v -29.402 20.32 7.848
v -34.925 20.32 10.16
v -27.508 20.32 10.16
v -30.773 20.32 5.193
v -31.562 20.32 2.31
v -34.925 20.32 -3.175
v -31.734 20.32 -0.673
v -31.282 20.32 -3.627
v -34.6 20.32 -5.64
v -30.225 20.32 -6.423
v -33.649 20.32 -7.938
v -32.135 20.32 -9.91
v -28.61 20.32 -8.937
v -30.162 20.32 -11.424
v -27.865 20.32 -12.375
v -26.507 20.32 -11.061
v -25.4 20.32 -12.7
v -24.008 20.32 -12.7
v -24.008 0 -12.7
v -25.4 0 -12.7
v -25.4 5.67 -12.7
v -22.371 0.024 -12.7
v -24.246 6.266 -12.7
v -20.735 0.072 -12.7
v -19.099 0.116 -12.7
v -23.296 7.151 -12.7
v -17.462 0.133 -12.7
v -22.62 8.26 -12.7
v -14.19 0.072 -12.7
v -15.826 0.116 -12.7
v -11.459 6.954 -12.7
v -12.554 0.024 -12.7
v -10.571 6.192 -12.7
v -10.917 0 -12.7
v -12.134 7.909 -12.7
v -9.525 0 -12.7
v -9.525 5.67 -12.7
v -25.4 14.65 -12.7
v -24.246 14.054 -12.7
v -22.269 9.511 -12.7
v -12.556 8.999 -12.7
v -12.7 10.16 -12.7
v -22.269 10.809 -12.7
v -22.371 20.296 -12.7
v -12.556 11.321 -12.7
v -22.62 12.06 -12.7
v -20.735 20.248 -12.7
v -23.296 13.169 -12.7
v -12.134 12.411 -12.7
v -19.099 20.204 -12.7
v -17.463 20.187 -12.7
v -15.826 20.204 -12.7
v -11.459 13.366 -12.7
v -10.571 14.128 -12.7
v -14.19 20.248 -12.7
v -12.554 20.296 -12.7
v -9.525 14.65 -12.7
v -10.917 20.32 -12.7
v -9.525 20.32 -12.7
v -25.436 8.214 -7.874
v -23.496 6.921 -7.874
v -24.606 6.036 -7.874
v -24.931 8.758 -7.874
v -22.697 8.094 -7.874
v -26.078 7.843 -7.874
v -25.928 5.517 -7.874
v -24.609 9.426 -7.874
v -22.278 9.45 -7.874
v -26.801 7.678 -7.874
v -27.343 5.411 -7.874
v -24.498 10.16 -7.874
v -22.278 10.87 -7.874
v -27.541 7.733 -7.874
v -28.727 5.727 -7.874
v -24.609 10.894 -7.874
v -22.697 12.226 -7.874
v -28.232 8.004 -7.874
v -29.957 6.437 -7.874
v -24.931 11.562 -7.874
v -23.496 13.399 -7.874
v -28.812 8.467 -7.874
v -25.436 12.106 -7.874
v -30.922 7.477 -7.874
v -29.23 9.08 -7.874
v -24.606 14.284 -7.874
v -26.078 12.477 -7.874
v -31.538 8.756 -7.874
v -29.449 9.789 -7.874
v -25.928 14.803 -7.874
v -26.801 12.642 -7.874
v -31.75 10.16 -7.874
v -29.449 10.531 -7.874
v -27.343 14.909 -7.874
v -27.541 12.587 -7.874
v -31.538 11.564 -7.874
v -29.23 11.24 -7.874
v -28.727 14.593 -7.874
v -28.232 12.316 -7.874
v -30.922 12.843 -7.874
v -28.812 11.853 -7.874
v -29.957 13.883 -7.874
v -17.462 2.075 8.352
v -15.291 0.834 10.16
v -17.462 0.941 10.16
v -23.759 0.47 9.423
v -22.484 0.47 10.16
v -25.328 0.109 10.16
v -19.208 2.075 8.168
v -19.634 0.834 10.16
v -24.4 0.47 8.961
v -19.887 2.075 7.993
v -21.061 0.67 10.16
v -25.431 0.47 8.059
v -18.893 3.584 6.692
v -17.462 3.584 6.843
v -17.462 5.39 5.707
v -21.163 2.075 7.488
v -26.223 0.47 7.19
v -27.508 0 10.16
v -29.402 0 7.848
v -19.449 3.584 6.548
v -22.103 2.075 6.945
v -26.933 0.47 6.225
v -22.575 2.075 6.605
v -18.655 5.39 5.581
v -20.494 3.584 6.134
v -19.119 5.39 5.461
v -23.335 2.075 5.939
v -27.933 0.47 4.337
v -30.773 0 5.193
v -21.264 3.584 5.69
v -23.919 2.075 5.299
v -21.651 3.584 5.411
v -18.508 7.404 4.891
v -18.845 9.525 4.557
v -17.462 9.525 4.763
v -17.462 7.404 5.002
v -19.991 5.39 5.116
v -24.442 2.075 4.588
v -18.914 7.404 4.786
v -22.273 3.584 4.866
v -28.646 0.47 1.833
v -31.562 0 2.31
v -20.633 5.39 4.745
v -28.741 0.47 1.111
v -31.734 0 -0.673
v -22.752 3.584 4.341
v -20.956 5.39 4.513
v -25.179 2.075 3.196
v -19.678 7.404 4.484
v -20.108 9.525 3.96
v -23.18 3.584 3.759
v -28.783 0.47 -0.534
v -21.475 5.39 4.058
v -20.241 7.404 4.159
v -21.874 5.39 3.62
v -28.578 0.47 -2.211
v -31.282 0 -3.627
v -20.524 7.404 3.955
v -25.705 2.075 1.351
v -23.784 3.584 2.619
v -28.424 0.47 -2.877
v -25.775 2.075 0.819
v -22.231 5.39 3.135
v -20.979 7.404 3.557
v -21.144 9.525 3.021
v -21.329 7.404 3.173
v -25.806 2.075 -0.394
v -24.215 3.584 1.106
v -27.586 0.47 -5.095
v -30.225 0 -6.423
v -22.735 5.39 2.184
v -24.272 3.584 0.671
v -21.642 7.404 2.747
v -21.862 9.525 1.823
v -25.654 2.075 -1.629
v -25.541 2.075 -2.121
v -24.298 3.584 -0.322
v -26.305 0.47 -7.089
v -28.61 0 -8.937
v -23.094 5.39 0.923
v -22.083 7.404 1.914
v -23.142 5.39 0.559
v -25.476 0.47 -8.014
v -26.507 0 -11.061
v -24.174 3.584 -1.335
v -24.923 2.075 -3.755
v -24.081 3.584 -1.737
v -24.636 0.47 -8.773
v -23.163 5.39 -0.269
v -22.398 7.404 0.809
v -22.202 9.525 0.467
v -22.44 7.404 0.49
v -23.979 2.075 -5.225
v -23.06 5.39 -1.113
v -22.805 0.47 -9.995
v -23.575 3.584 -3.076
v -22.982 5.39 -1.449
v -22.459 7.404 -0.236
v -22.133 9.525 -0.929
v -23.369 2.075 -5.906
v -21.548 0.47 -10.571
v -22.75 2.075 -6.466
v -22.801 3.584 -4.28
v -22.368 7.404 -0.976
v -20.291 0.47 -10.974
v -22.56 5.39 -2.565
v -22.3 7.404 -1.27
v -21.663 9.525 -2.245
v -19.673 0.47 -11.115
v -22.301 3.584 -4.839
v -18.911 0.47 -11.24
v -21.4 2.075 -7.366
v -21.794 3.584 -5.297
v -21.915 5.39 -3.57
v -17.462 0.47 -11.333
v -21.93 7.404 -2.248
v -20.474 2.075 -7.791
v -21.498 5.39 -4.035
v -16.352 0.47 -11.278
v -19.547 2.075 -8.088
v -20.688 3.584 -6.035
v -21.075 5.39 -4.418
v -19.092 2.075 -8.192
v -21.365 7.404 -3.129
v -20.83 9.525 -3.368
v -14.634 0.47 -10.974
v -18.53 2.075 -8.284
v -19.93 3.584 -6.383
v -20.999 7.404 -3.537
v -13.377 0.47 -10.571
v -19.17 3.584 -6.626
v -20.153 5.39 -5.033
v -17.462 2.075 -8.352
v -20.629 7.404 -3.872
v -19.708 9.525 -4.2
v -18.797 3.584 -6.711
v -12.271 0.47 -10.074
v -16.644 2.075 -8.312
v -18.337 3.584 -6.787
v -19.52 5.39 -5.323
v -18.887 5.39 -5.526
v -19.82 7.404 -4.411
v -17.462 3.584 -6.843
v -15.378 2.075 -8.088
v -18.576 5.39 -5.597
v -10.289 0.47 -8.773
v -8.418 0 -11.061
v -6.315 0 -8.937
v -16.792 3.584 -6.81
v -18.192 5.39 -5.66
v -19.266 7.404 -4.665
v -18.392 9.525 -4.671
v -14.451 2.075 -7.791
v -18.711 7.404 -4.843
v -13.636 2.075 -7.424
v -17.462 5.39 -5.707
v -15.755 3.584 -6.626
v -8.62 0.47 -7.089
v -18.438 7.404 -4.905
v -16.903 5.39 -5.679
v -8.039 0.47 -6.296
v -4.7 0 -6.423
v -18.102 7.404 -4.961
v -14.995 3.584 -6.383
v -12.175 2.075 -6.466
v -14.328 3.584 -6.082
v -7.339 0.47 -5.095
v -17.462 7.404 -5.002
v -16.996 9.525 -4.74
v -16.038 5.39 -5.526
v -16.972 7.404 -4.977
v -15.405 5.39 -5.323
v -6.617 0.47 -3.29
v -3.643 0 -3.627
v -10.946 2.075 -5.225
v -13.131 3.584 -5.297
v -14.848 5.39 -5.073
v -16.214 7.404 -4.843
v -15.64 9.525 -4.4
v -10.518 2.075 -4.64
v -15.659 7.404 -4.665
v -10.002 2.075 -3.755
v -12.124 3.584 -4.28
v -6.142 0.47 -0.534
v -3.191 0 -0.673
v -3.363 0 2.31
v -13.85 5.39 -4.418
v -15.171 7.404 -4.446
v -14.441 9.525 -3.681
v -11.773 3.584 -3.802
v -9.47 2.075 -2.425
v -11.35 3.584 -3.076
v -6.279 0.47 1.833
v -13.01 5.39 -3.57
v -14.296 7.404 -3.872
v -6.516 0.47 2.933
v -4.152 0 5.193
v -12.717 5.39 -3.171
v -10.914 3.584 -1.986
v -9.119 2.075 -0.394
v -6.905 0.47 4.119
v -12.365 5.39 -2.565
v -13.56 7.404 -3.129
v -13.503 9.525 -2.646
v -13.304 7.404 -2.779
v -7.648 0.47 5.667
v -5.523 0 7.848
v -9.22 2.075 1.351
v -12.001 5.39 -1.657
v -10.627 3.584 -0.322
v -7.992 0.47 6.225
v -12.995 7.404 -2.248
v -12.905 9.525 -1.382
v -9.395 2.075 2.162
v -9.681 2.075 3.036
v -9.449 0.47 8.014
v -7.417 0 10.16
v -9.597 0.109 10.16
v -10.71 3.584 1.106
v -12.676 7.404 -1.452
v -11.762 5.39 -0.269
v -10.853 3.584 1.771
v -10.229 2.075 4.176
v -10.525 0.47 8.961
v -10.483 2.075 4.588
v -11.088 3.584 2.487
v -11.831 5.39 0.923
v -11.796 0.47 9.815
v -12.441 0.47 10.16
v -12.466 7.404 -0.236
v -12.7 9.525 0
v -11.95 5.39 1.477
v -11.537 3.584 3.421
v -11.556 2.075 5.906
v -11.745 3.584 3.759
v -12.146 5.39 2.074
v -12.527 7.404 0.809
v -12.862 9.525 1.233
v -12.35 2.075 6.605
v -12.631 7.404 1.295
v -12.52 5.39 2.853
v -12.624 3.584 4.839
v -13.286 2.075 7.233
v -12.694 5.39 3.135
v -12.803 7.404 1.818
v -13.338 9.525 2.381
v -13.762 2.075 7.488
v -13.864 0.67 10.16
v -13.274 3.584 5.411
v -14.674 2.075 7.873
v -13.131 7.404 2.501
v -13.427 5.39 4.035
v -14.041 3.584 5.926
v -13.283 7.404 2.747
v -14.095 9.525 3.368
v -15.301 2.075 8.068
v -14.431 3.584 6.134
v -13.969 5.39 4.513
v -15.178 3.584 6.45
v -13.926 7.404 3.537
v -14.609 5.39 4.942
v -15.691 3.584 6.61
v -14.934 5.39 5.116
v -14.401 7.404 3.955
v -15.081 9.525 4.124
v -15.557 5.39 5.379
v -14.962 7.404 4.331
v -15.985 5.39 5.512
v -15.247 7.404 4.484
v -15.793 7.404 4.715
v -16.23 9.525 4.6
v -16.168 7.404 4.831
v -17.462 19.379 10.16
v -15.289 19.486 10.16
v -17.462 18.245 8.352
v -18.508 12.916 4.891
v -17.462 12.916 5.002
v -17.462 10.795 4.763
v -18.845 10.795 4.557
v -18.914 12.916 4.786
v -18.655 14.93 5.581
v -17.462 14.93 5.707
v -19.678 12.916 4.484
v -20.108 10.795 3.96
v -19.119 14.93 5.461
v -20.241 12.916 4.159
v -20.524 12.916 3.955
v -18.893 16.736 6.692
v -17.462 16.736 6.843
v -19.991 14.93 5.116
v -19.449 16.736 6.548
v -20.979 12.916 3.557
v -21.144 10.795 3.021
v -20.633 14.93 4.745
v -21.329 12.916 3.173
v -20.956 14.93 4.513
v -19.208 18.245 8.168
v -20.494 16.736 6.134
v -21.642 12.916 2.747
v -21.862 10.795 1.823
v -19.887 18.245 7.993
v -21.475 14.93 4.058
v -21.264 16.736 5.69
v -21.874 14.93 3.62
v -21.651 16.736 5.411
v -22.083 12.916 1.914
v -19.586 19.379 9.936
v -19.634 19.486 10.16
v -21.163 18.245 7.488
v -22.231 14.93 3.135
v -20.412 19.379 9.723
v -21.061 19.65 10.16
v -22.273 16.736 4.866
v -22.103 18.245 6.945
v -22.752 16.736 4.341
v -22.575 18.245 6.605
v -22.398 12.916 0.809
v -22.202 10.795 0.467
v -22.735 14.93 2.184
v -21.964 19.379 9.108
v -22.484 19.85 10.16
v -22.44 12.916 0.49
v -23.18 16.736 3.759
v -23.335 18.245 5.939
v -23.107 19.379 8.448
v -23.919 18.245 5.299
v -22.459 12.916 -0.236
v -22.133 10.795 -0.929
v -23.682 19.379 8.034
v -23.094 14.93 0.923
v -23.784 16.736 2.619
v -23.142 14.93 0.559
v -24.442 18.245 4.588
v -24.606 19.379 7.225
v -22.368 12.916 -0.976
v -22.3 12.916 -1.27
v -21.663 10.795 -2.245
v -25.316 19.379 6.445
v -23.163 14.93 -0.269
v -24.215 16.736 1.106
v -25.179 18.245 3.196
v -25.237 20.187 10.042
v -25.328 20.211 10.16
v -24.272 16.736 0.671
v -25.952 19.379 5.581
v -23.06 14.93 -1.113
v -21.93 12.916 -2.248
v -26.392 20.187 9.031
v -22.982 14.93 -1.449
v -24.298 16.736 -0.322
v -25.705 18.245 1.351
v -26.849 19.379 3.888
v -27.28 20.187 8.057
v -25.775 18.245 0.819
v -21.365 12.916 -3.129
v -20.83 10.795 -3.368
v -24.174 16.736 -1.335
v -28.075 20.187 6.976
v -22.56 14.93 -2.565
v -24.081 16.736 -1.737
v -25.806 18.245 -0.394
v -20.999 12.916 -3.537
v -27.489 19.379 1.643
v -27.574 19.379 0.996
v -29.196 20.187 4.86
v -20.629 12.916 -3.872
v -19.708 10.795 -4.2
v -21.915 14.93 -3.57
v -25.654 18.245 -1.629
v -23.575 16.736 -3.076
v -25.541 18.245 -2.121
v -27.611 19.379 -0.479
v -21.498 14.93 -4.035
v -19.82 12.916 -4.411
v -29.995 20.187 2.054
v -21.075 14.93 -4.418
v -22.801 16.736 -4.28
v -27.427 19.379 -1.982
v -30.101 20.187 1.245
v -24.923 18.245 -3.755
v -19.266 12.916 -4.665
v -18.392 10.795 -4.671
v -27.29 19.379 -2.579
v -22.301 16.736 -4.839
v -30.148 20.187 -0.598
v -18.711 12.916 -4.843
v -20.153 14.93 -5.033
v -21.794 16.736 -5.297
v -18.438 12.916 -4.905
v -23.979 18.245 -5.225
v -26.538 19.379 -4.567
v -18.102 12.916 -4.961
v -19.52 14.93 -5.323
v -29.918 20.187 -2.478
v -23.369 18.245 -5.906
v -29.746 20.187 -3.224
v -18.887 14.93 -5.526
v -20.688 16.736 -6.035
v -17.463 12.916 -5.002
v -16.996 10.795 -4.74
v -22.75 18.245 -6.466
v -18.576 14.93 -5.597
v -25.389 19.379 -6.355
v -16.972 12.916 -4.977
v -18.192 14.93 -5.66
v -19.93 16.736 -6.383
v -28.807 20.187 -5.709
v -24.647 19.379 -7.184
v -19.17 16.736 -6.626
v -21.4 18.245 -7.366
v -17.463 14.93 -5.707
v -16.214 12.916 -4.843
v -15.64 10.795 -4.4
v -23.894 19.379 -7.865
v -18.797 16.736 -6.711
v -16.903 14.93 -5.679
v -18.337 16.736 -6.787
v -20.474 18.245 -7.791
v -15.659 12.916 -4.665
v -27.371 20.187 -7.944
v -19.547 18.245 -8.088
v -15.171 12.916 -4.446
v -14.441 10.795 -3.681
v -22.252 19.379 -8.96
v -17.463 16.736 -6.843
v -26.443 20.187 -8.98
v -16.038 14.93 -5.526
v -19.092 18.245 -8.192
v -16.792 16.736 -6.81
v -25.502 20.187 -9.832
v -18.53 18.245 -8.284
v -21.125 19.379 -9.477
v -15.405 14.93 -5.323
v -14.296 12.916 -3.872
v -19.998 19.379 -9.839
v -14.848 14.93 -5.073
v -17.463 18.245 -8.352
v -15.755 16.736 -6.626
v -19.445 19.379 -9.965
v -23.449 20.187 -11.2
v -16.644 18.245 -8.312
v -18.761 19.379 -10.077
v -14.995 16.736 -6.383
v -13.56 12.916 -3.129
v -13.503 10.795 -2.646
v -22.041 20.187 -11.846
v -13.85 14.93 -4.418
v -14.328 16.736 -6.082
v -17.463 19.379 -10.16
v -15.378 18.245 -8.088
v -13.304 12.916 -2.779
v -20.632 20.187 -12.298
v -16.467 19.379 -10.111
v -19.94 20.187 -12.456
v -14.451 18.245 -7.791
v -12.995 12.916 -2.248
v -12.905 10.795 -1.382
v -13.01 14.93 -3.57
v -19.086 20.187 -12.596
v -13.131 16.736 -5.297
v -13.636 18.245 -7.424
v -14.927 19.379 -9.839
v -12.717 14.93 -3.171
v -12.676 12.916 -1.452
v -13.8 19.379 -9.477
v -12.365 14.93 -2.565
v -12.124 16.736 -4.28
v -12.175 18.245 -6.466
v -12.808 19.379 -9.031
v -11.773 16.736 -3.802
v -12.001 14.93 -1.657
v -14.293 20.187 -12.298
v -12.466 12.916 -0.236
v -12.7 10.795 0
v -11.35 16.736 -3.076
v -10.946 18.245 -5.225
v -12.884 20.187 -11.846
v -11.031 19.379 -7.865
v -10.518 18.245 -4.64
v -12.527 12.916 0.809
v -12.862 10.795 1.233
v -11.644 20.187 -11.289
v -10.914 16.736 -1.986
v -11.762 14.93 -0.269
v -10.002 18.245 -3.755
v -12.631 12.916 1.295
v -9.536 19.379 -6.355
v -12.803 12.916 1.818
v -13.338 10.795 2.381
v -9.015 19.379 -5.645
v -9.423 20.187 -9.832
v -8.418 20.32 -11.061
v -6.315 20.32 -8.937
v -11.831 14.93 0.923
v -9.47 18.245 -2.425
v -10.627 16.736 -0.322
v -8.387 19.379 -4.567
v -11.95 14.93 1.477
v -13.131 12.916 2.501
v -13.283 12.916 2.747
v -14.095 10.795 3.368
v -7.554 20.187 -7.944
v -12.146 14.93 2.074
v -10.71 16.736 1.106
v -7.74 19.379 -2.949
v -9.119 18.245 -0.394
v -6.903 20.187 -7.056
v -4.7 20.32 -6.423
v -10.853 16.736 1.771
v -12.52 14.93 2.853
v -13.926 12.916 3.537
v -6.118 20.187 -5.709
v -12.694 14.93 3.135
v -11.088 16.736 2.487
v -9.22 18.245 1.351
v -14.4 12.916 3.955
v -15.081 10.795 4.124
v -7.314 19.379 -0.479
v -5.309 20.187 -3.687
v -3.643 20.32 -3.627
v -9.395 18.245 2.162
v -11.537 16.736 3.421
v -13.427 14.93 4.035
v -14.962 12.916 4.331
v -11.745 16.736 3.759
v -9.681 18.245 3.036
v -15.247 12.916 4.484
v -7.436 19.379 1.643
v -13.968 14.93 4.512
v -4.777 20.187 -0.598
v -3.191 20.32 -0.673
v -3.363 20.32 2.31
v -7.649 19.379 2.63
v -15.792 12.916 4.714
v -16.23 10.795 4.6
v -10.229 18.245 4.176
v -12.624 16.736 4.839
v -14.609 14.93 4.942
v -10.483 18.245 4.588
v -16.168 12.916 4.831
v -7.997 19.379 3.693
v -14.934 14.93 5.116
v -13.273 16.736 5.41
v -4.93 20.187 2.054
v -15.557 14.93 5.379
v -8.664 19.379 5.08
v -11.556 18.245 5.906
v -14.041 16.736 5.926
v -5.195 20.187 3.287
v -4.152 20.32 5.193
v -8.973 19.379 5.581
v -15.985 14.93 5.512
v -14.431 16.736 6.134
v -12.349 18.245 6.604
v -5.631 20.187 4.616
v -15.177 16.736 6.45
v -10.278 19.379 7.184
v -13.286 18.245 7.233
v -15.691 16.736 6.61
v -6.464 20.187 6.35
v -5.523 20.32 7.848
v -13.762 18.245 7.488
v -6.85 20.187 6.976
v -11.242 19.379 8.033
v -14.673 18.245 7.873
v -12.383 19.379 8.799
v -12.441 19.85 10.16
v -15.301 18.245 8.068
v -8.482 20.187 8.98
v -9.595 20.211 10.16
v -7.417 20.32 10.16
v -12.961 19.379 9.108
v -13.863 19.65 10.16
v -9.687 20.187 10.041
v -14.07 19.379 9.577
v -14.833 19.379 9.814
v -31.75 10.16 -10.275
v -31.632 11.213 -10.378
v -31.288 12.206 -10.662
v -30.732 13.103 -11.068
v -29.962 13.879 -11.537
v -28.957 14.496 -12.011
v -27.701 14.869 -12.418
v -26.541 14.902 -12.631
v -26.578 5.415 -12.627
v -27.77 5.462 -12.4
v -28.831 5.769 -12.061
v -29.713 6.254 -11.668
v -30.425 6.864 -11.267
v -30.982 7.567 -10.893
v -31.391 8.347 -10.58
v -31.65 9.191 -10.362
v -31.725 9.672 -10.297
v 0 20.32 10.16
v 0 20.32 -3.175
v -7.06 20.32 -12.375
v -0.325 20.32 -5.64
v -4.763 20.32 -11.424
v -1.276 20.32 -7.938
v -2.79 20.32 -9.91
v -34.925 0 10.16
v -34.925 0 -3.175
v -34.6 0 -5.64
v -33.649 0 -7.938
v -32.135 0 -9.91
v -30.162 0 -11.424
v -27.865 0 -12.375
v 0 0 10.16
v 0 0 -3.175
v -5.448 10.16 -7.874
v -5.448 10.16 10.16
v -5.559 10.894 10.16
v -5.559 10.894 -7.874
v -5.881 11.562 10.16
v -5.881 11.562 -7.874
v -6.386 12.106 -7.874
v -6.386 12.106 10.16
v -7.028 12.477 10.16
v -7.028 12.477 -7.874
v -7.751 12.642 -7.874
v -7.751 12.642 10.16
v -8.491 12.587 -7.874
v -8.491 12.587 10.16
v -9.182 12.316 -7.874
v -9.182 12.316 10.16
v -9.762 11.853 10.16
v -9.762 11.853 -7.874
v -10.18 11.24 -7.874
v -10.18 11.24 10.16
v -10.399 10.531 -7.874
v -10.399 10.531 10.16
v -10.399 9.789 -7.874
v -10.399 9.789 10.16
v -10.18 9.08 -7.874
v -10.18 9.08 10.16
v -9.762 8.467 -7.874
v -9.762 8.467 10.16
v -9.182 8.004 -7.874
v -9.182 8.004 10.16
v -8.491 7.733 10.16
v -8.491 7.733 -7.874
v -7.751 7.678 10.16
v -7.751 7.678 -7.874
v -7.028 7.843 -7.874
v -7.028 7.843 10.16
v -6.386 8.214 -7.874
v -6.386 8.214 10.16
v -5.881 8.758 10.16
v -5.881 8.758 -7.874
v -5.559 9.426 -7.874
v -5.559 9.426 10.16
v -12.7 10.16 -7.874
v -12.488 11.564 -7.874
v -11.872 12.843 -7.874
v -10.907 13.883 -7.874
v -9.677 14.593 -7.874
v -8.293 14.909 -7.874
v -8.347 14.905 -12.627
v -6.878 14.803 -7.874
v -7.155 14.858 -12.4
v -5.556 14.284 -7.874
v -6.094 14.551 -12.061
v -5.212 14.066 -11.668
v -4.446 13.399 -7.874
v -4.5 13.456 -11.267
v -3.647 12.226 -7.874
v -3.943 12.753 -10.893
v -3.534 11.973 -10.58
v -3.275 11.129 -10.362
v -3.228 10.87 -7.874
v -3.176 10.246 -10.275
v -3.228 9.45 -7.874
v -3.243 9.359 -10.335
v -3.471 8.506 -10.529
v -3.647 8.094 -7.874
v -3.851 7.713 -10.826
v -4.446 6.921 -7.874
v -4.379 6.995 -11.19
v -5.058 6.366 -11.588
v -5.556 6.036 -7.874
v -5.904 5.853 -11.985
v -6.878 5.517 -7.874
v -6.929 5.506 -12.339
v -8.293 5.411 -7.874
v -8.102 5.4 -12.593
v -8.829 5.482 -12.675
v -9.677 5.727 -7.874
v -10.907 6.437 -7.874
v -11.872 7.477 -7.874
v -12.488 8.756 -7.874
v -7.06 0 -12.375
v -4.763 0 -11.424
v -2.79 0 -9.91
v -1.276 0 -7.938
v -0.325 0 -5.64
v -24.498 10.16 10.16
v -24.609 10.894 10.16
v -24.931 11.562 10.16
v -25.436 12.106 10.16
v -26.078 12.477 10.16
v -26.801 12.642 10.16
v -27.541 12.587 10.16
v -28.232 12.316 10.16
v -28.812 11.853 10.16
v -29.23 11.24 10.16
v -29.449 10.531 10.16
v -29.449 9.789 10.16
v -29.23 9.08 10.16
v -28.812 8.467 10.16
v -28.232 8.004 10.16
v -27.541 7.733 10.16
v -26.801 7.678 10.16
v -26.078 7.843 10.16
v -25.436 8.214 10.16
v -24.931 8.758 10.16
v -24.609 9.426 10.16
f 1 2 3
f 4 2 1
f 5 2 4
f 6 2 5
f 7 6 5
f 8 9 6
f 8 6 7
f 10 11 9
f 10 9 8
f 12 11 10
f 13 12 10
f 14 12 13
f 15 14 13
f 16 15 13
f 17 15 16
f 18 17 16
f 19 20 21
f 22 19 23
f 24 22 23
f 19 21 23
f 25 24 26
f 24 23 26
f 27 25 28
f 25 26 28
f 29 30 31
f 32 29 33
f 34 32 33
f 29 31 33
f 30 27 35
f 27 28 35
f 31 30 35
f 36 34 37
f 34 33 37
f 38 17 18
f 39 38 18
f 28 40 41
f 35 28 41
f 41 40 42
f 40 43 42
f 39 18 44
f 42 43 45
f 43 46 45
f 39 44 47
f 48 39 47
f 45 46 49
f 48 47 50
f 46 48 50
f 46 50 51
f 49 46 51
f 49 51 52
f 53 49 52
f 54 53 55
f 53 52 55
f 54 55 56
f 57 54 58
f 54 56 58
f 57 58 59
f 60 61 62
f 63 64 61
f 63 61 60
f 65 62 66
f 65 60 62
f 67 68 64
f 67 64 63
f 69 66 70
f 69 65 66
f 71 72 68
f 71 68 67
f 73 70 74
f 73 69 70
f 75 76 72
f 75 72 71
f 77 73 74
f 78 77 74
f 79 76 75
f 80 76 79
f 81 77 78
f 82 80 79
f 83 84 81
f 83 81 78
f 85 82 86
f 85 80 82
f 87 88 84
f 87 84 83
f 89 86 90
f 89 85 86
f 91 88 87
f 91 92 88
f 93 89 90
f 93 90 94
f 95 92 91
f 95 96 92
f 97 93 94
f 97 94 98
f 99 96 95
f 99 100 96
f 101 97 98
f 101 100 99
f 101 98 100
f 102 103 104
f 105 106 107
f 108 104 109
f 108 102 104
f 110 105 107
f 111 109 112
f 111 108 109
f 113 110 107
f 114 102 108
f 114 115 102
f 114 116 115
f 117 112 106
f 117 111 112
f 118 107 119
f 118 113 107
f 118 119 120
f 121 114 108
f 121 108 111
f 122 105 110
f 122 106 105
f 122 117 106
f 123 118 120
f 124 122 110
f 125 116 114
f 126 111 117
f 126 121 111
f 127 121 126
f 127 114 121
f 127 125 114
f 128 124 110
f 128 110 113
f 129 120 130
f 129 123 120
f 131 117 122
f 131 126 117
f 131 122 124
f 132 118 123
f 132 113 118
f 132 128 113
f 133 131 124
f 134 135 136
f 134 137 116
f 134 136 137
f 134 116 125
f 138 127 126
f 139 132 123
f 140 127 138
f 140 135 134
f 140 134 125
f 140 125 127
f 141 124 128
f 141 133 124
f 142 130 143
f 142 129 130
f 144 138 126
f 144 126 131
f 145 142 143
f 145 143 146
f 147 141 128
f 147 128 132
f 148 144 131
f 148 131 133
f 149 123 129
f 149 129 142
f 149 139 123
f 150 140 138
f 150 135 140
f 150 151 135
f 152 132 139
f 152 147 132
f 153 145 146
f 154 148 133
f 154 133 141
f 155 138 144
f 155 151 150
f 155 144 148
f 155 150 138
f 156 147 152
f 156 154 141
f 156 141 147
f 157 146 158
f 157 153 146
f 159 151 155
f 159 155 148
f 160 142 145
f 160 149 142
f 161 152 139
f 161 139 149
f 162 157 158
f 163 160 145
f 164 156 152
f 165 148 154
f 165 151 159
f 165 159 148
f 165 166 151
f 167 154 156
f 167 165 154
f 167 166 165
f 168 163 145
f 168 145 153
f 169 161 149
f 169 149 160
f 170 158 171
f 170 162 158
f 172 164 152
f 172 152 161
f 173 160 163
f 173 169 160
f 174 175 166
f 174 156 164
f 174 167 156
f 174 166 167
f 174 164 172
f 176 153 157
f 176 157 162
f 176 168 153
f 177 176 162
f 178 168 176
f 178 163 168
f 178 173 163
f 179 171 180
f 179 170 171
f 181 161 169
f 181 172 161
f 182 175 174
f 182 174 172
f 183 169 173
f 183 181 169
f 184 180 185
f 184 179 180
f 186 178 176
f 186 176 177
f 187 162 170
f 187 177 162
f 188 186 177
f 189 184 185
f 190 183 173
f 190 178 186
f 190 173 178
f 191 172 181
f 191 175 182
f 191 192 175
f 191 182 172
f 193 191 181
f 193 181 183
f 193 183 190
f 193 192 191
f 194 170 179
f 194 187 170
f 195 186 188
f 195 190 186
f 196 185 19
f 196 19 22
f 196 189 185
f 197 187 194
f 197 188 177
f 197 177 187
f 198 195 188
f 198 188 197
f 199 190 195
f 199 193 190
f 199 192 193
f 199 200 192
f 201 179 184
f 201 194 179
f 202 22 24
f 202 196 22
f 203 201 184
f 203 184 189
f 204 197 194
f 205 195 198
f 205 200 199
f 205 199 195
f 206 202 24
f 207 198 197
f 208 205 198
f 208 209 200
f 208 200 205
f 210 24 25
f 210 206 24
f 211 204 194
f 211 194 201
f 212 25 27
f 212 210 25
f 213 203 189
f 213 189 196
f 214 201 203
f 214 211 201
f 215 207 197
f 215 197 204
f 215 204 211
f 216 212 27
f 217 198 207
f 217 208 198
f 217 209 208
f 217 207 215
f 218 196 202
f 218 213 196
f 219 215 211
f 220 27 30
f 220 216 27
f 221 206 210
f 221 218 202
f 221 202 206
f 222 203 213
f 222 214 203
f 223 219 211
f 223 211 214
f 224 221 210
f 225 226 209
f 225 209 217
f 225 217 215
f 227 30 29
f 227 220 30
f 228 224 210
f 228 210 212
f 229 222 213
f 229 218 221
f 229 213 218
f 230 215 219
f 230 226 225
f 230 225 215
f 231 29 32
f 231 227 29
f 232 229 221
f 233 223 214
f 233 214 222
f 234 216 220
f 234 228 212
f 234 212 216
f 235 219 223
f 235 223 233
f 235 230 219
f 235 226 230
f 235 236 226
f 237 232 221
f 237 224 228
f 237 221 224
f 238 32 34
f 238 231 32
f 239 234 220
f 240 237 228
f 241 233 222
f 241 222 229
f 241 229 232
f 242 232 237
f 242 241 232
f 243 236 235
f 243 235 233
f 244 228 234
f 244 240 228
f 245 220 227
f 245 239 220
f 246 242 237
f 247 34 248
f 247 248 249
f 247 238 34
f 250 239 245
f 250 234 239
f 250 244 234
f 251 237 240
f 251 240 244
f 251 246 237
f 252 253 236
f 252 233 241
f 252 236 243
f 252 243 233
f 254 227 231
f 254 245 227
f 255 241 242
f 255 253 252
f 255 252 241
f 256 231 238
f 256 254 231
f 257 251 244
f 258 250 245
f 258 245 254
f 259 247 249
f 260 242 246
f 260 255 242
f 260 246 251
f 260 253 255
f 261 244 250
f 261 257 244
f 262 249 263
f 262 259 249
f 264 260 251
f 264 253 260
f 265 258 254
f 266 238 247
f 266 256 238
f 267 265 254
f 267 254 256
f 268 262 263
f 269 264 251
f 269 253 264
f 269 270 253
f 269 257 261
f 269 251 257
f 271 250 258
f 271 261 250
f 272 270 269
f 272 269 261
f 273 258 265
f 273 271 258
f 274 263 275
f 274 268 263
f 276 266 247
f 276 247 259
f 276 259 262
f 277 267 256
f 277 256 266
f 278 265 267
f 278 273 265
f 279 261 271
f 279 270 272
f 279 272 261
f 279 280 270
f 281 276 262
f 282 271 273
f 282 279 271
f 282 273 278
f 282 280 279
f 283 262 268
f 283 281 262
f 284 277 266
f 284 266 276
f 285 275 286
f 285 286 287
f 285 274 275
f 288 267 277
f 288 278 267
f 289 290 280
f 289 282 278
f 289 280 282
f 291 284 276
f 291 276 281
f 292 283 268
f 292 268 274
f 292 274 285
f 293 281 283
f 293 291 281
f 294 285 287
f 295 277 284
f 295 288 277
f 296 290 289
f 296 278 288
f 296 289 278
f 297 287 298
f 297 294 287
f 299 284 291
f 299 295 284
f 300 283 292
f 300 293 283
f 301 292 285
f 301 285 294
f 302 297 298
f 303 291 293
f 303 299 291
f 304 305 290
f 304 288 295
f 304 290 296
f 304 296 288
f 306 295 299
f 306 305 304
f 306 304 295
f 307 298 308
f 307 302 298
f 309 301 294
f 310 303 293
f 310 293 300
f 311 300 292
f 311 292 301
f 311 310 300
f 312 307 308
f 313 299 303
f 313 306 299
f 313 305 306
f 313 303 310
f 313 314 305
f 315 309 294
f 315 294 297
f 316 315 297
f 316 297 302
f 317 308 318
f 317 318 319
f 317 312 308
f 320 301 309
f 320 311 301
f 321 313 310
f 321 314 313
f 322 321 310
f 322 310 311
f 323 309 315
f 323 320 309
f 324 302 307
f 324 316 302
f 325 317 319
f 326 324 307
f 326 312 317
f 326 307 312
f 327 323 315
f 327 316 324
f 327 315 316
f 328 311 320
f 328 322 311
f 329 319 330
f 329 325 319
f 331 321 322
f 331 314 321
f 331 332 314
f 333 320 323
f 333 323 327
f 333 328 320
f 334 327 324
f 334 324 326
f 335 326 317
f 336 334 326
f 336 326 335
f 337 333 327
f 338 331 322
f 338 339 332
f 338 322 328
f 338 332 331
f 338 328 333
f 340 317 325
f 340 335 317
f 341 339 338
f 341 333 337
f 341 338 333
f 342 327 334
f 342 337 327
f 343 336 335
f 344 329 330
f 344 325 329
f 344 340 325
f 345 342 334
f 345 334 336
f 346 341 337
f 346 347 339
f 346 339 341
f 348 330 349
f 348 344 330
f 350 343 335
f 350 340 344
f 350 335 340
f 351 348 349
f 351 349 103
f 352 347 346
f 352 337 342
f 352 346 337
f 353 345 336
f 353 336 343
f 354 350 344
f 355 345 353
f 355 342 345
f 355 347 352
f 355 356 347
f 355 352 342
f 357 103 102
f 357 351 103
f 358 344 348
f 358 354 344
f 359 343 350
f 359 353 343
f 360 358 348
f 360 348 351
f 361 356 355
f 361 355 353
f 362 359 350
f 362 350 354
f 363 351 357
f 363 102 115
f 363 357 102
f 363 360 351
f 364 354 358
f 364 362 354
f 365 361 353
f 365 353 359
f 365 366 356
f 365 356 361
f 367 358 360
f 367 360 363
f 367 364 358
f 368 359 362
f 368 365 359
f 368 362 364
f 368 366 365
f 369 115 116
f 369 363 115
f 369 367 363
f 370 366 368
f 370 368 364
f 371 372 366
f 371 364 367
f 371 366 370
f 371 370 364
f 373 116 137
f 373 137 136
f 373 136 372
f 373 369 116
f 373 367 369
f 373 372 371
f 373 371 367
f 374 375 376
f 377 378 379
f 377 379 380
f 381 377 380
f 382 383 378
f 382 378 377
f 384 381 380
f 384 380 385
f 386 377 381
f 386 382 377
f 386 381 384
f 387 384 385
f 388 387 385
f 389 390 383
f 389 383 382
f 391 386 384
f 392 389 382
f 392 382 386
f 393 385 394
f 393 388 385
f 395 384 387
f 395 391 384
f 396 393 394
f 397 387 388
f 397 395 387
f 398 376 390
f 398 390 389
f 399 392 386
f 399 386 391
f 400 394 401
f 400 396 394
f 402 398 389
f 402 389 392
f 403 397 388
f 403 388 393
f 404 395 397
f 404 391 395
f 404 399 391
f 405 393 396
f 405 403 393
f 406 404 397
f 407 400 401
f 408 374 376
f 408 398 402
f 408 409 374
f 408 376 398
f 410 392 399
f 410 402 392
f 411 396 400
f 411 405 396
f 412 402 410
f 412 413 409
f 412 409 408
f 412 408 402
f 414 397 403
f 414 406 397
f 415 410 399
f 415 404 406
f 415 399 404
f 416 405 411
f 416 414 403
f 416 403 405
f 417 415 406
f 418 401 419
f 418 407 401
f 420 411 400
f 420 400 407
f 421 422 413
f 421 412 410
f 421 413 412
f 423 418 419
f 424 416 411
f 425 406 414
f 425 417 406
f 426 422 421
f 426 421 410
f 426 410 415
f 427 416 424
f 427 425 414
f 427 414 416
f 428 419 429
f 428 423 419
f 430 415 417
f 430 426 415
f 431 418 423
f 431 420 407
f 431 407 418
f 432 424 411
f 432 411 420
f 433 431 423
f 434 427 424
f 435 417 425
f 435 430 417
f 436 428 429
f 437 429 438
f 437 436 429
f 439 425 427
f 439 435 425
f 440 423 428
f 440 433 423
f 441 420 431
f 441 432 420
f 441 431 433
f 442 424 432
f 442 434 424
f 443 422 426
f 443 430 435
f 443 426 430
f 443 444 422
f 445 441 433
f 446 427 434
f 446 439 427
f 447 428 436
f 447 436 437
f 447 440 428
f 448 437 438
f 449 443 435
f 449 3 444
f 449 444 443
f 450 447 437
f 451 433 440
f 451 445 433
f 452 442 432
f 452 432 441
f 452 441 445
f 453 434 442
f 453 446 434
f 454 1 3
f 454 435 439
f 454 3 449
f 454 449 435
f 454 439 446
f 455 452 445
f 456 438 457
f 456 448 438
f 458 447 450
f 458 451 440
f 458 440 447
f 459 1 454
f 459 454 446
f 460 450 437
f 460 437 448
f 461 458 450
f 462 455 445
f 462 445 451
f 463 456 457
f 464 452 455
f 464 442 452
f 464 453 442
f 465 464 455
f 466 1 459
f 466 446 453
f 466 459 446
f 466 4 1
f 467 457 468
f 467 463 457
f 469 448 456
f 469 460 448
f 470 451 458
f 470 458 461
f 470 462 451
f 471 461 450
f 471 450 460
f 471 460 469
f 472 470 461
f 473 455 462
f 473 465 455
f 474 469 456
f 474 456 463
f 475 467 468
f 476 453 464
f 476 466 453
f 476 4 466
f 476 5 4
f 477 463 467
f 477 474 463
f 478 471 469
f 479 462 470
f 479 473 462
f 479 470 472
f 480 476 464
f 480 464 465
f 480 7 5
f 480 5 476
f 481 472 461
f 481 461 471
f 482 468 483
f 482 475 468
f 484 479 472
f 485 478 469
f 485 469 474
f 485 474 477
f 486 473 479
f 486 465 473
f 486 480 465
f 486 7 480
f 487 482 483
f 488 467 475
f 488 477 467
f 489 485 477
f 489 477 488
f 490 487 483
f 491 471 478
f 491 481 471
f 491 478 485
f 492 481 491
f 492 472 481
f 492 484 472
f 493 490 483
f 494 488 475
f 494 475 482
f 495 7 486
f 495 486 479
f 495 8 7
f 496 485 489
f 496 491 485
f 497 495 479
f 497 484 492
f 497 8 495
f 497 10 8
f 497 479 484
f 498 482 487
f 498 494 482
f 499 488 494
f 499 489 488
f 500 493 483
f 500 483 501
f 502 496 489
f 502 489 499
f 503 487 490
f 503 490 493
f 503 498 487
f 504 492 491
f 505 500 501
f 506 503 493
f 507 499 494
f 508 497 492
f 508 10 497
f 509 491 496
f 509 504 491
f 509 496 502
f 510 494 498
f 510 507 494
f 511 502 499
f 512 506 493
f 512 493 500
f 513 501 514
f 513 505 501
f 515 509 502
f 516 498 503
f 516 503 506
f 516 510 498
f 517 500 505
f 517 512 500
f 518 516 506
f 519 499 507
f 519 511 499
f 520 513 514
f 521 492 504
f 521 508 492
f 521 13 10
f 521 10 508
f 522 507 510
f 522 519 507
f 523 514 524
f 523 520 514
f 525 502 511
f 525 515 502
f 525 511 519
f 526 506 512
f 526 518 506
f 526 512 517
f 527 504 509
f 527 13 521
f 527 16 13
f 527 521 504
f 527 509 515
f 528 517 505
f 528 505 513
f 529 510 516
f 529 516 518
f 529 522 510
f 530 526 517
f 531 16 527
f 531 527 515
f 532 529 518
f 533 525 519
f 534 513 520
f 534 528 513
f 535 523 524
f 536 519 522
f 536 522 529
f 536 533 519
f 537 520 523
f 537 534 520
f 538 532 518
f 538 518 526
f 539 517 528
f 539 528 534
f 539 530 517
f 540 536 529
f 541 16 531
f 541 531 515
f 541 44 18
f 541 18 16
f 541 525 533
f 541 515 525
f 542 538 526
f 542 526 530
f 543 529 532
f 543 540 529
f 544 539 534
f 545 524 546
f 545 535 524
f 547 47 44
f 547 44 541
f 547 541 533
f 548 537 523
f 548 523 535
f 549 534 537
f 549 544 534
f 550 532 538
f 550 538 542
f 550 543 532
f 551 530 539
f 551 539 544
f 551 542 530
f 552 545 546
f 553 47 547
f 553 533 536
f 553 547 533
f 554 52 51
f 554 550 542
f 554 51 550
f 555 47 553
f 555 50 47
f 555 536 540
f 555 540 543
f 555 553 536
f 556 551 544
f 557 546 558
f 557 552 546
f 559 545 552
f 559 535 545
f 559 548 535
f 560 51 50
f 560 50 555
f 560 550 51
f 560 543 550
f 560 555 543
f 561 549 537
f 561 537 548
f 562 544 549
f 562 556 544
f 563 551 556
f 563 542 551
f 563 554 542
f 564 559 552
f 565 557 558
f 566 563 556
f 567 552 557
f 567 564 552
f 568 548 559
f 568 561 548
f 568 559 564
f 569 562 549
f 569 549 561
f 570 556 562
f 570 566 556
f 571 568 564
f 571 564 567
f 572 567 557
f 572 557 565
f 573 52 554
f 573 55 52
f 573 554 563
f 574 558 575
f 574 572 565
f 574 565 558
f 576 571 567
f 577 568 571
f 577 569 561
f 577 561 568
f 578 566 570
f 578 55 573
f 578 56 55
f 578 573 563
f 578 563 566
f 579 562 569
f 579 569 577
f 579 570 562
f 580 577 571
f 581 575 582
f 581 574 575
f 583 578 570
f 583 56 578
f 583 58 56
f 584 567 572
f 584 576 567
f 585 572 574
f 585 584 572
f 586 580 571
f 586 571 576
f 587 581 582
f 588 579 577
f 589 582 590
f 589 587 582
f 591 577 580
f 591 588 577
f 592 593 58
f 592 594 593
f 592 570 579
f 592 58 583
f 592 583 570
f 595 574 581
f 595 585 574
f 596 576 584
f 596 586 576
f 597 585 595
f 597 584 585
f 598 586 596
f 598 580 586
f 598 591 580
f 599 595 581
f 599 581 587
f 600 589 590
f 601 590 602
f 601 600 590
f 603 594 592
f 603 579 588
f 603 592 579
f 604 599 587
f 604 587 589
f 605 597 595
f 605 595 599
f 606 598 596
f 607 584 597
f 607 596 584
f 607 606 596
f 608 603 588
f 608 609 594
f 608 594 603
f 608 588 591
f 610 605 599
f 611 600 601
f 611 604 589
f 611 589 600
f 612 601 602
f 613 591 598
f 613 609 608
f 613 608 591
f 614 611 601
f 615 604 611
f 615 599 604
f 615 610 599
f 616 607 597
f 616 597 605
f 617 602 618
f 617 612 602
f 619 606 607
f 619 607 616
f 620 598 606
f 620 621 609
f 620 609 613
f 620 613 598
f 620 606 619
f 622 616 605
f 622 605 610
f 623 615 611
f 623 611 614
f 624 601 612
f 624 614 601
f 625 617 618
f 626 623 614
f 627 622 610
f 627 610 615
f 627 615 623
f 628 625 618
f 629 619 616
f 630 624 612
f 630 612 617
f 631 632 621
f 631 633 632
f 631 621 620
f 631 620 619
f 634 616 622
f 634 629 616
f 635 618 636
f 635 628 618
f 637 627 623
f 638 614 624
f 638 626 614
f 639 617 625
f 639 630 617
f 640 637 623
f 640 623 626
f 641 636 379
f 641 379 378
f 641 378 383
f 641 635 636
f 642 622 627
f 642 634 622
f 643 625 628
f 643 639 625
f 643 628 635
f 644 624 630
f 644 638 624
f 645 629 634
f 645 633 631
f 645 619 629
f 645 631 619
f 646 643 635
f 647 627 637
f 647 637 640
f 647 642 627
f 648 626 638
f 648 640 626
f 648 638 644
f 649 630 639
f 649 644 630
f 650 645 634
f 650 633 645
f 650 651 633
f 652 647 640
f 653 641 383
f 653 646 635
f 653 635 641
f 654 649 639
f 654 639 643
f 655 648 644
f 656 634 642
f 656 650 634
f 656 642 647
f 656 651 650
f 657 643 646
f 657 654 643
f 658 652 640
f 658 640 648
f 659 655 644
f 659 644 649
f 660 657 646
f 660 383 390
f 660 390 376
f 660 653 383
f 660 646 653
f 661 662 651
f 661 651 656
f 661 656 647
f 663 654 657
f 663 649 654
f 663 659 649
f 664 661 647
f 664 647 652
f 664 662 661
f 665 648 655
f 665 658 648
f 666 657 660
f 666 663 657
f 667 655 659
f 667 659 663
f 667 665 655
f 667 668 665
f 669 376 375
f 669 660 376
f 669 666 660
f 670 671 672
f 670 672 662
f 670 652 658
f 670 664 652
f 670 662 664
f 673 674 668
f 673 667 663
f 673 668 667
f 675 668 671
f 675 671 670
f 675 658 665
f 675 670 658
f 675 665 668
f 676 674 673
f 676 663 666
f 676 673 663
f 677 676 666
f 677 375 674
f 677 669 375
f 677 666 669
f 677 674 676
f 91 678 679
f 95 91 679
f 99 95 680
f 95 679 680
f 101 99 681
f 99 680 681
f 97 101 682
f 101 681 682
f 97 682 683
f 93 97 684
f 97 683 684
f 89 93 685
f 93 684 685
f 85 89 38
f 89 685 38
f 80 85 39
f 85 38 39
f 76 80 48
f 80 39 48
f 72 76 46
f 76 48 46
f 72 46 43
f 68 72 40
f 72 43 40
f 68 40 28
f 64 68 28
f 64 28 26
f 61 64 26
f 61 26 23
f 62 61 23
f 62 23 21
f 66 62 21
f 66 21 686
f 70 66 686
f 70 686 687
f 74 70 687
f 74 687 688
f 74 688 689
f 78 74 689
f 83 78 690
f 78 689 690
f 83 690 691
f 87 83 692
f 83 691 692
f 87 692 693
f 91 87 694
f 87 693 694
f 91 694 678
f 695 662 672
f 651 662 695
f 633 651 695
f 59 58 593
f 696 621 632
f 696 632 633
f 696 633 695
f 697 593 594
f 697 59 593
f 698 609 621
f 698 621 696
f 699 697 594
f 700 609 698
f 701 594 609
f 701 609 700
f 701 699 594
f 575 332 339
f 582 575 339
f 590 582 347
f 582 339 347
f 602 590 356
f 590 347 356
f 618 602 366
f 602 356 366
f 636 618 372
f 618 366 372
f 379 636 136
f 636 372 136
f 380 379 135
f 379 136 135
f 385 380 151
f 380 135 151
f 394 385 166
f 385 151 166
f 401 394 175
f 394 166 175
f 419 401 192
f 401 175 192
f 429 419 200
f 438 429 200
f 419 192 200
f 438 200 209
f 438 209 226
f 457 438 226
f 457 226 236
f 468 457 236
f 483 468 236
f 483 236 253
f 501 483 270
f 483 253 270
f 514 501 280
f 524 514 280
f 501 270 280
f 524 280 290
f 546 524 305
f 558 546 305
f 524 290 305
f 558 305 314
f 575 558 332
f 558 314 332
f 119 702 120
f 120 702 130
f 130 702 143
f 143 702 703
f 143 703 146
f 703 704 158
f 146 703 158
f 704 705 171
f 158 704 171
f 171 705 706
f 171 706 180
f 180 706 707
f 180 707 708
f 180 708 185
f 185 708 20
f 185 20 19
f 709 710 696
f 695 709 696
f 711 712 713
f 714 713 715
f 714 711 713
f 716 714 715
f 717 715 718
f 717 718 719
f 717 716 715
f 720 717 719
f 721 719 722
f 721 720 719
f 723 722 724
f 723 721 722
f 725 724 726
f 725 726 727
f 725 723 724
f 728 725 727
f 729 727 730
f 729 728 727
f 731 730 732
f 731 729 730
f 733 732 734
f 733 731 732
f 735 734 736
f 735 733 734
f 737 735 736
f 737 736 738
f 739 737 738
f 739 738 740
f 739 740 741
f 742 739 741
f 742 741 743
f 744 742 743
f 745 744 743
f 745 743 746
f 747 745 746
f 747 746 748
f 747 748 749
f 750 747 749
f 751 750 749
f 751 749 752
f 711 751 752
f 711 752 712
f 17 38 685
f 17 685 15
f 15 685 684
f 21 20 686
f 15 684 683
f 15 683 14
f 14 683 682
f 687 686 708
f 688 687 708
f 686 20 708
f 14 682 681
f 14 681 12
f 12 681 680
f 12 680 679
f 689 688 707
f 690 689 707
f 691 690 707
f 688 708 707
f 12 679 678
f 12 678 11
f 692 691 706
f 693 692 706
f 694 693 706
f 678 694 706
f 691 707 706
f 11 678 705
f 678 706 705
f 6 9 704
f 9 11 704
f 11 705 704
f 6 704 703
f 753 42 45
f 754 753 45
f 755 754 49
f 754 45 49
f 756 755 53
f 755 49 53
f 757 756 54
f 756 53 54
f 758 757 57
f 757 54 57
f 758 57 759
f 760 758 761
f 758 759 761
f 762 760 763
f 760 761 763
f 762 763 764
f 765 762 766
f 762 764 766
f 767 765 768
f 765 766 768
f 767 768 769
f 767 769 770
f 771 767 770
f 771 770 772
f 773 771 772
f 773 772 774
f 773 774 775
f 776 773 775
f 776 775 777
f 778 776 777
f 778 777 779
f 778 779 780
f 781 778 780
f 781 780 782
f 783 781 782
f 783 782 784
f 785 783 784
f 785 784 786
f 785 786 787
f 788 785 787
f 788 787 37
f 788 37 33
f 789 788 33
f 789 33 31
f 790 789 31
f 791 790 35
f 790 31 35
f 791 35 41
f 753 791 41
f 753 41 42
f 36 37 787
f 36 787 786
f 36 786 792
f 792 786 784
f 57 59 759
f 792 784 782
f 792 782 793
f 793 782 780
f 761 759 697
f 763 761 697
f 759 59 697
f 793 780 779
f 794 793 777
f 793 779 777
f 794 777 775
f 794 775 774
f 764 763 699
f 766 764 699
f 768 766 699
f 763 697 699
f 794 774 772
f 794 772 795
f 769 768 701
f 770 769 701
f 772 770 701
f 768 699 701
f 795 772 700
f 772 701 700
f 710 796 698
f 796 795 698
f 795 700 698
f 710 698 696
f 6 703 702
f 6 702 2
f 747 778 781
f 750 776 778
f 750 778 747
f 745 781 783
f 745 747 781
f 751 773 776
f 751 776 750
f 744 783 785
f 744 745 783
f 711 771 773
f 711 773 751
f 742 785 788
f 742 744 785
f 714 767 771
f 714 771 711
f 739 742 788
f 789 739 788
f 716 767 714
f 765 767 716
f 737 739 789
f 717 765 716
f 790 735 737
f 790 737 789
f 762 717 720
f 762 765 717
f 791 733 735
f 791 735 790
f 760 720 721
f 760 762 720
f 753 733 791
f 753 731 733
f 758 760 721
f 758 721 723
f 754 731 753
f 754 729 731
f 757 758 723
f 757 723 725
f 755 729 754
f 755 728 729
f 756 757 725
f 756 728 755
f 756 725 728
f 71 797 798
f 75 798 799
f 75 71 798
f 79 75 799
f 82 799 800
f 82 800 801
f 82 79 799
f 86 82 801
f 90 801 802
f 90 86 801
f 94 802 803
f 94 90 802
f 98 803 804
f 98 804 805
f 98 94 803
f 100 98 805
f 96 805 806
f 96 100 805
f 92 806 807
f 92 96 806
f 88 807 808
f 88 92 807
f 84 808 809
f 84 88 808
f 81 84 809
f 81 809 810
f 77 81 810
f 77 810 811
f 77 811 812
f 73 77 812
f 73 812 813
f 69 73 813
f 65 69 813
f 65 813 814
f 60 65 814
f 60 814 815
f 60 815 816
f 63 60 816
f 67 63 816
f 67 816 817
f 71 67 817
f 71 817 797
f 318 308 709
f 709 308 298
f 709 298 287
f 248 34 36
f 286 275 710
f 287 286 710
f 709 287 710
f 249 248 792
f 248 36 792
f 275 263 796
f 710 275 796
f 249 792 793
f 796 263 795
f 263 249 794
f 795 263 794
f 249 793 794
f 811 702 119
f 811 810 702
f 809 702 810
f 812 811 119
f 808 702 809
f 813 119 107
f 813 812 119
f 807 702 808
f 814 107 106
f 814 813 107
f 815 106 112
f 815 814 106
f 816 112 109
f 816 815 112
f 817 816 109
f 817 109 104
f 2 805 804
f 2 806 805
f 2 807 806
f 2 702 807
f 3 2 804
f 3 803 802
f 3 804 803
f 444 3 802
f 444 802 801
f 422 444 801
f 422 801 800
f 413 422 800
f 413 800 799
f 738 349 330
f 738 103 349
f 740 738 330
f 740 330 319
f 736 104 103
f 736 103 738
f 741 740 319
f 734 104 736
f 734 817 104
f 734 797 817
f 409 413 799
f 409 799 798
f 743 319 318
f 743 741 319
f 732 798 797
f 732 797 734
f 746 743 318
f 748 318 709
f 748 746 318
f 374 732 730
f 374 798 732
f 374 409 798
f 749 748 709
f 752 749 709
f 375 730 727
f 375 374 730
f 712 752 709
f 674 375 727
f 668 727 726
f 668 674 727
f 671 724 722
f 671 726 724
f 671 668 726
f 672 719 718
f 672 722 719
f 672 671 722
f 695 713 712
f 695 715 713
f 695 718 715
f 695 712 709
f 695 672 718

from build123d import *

# Parameters (mm, degrees)
BOSS_EXTRUDE1_DEPTH                             = 10.16
BOSS_EXTRUDE1_DEPTH_BACK                        = 12.7
SKETCH2_W                                       = 34.925
SKETCH2_H                                       = 20.32
SKETCH2_R                                       = 2.4892
SKETCH3_R                                       = 4.7625
CUT_EXTRUDE1_DEPTH                              = 43.35502361
CBORE_FOR_10_SOCKET_HEAD_CAP_SCREW1_D           = 4.9784
CBORE_FOR_10_SOCKET_HEAD_CAP_SCREW1_CBORE_D     = 9.525
CBORE_FOR_10_SOCKET_HEAD_CAP_SCREW1_CBORE_DEPTH = 4.826
FILLET1_R                                       = 9.525


with BuildPart() as part:
    # Sketch2 → Boss-Extrude1 (new, two sides: drawn at the far end of the back side and taken through both)
    with BuildSketch(Plane.XY.offset(-BOSS_EXTRUDE1_DEPTH_BACK)):
        with Locations((-17.4625, 10.16)):
            Rectangle(SKETCH2_W, SKETCH2_H)
        with Locations((-7.9375, 10.16)):
            Circle(SKETCH2_R, mode=Mode.SUBTRACT)
        with Locations((-26.9875, 10.16)):
            Circle(SKETCH2_R, mode=Mode.SUBTRACT)
    extrude(amount=BOSS_EXTRUDE1_DEPTH + BOSS_EXTRUDE1_DEPTH_BACK)

    # Sketch3 → Cut-Extrude1 (cut, through all)
    with BuildSketch(Plane.XZ):
        with Locations((-17.4625, 0)):
            Circle(SKETCH3_R)
    extrude(amount=-CUT_EXTRUDE1_DEPTH, mode=Mode.SUBTRACT)

    # Sketch4 → Cut-Revolve1 (revolve, cut)
    with BuildSketch(Plane.XY, mode=Mode.PRIVATE) as cut_revolve1_sk:
        with BuildLine():
            Line((-31.75, 20.32), (-17.4625, 20.32))
            Line((-17.4625, 20.32), (-17.4625, 0))
            Line((-17.4625, 0), (-31.75, 0))
            ThreePointArc((-31.75, 0), (-25.014807909, 2.789807909), (-22.225, 9.525))
            Line((-22.225, 9.525), (-22.225, 10.795))
            ThreePointArc((-22.225, 10.795), (-25.014807909, 17.530192091), (-31.75, 20.32))
        make_face()
    revolve(cut_revolve1_sk.sketch.rotate(Axis((-17.4625, 20.32, 0), (0, -1, 0)), 270), axis=Axis((-17.4625, 20.32, 0), (0, -1, 0)), mode=Mode.SUBTRACT)

    # CBORE for #10 Socket Head Cap Screw1 (through all)
    with Locations(Plane(origin=(0, 0, -12.7), x_dir=(-1, 0, 0), z_dir=(0, 0, -1))):
        with Locations((26.9875, 10.16), (7.9375, 10.16)):
            CounterBoreHole(CBORE_FOR_10_SOCKET_HEAD_CAP_SCREW1_D / 2, CBORE_FOR_10_SOCKET_HEAD_CAP_SCREW1_CBORE_D / 2, CBORE_FOR_10_SOCKET_HEAD_CAP_SCREW1_CBORE_DEPTH)

    # Fillet1
    # the kernel refuses this fillet: 9.525 mm, written as the material it takes off along each edge
    with BuildSketch(Plane(origin=(-34.925, -23.8125, -12.7), x_dir=(1, 0, 0), z_dir=(0, 1, 0))) as fillet1_piece_1:
        with BuildLine():
            CenterArc((FILLET1_R, -FILLET1_R), FILLET1_R, 90, 90)
            Line((0, -FILLET1_R), (0, 0))
            Line((0, 0), (FILLET1_R, 0))
        make_face()
    extrude(amount=67.945, mode=Mode.SUBTRACT)
    with BuildSketch(Plane(origin=(0, 44.1325, -12.7), x_dir=(0, 0, 1), z_dir=(0, -1, 0))) as fillet1_piece_2:
        with BuildLine():
            CenterArc((FILLET1_R, FILLET1_R), FILLET1_R, 180, 90)
            Line((0, FILLET1_R), (0, 0))
            Line((0, 0), (FILLET1_R, 0))
        make_face()
    extrude(amount=67.945, mode=Mode.SUBTRACT)


solid = part.part
